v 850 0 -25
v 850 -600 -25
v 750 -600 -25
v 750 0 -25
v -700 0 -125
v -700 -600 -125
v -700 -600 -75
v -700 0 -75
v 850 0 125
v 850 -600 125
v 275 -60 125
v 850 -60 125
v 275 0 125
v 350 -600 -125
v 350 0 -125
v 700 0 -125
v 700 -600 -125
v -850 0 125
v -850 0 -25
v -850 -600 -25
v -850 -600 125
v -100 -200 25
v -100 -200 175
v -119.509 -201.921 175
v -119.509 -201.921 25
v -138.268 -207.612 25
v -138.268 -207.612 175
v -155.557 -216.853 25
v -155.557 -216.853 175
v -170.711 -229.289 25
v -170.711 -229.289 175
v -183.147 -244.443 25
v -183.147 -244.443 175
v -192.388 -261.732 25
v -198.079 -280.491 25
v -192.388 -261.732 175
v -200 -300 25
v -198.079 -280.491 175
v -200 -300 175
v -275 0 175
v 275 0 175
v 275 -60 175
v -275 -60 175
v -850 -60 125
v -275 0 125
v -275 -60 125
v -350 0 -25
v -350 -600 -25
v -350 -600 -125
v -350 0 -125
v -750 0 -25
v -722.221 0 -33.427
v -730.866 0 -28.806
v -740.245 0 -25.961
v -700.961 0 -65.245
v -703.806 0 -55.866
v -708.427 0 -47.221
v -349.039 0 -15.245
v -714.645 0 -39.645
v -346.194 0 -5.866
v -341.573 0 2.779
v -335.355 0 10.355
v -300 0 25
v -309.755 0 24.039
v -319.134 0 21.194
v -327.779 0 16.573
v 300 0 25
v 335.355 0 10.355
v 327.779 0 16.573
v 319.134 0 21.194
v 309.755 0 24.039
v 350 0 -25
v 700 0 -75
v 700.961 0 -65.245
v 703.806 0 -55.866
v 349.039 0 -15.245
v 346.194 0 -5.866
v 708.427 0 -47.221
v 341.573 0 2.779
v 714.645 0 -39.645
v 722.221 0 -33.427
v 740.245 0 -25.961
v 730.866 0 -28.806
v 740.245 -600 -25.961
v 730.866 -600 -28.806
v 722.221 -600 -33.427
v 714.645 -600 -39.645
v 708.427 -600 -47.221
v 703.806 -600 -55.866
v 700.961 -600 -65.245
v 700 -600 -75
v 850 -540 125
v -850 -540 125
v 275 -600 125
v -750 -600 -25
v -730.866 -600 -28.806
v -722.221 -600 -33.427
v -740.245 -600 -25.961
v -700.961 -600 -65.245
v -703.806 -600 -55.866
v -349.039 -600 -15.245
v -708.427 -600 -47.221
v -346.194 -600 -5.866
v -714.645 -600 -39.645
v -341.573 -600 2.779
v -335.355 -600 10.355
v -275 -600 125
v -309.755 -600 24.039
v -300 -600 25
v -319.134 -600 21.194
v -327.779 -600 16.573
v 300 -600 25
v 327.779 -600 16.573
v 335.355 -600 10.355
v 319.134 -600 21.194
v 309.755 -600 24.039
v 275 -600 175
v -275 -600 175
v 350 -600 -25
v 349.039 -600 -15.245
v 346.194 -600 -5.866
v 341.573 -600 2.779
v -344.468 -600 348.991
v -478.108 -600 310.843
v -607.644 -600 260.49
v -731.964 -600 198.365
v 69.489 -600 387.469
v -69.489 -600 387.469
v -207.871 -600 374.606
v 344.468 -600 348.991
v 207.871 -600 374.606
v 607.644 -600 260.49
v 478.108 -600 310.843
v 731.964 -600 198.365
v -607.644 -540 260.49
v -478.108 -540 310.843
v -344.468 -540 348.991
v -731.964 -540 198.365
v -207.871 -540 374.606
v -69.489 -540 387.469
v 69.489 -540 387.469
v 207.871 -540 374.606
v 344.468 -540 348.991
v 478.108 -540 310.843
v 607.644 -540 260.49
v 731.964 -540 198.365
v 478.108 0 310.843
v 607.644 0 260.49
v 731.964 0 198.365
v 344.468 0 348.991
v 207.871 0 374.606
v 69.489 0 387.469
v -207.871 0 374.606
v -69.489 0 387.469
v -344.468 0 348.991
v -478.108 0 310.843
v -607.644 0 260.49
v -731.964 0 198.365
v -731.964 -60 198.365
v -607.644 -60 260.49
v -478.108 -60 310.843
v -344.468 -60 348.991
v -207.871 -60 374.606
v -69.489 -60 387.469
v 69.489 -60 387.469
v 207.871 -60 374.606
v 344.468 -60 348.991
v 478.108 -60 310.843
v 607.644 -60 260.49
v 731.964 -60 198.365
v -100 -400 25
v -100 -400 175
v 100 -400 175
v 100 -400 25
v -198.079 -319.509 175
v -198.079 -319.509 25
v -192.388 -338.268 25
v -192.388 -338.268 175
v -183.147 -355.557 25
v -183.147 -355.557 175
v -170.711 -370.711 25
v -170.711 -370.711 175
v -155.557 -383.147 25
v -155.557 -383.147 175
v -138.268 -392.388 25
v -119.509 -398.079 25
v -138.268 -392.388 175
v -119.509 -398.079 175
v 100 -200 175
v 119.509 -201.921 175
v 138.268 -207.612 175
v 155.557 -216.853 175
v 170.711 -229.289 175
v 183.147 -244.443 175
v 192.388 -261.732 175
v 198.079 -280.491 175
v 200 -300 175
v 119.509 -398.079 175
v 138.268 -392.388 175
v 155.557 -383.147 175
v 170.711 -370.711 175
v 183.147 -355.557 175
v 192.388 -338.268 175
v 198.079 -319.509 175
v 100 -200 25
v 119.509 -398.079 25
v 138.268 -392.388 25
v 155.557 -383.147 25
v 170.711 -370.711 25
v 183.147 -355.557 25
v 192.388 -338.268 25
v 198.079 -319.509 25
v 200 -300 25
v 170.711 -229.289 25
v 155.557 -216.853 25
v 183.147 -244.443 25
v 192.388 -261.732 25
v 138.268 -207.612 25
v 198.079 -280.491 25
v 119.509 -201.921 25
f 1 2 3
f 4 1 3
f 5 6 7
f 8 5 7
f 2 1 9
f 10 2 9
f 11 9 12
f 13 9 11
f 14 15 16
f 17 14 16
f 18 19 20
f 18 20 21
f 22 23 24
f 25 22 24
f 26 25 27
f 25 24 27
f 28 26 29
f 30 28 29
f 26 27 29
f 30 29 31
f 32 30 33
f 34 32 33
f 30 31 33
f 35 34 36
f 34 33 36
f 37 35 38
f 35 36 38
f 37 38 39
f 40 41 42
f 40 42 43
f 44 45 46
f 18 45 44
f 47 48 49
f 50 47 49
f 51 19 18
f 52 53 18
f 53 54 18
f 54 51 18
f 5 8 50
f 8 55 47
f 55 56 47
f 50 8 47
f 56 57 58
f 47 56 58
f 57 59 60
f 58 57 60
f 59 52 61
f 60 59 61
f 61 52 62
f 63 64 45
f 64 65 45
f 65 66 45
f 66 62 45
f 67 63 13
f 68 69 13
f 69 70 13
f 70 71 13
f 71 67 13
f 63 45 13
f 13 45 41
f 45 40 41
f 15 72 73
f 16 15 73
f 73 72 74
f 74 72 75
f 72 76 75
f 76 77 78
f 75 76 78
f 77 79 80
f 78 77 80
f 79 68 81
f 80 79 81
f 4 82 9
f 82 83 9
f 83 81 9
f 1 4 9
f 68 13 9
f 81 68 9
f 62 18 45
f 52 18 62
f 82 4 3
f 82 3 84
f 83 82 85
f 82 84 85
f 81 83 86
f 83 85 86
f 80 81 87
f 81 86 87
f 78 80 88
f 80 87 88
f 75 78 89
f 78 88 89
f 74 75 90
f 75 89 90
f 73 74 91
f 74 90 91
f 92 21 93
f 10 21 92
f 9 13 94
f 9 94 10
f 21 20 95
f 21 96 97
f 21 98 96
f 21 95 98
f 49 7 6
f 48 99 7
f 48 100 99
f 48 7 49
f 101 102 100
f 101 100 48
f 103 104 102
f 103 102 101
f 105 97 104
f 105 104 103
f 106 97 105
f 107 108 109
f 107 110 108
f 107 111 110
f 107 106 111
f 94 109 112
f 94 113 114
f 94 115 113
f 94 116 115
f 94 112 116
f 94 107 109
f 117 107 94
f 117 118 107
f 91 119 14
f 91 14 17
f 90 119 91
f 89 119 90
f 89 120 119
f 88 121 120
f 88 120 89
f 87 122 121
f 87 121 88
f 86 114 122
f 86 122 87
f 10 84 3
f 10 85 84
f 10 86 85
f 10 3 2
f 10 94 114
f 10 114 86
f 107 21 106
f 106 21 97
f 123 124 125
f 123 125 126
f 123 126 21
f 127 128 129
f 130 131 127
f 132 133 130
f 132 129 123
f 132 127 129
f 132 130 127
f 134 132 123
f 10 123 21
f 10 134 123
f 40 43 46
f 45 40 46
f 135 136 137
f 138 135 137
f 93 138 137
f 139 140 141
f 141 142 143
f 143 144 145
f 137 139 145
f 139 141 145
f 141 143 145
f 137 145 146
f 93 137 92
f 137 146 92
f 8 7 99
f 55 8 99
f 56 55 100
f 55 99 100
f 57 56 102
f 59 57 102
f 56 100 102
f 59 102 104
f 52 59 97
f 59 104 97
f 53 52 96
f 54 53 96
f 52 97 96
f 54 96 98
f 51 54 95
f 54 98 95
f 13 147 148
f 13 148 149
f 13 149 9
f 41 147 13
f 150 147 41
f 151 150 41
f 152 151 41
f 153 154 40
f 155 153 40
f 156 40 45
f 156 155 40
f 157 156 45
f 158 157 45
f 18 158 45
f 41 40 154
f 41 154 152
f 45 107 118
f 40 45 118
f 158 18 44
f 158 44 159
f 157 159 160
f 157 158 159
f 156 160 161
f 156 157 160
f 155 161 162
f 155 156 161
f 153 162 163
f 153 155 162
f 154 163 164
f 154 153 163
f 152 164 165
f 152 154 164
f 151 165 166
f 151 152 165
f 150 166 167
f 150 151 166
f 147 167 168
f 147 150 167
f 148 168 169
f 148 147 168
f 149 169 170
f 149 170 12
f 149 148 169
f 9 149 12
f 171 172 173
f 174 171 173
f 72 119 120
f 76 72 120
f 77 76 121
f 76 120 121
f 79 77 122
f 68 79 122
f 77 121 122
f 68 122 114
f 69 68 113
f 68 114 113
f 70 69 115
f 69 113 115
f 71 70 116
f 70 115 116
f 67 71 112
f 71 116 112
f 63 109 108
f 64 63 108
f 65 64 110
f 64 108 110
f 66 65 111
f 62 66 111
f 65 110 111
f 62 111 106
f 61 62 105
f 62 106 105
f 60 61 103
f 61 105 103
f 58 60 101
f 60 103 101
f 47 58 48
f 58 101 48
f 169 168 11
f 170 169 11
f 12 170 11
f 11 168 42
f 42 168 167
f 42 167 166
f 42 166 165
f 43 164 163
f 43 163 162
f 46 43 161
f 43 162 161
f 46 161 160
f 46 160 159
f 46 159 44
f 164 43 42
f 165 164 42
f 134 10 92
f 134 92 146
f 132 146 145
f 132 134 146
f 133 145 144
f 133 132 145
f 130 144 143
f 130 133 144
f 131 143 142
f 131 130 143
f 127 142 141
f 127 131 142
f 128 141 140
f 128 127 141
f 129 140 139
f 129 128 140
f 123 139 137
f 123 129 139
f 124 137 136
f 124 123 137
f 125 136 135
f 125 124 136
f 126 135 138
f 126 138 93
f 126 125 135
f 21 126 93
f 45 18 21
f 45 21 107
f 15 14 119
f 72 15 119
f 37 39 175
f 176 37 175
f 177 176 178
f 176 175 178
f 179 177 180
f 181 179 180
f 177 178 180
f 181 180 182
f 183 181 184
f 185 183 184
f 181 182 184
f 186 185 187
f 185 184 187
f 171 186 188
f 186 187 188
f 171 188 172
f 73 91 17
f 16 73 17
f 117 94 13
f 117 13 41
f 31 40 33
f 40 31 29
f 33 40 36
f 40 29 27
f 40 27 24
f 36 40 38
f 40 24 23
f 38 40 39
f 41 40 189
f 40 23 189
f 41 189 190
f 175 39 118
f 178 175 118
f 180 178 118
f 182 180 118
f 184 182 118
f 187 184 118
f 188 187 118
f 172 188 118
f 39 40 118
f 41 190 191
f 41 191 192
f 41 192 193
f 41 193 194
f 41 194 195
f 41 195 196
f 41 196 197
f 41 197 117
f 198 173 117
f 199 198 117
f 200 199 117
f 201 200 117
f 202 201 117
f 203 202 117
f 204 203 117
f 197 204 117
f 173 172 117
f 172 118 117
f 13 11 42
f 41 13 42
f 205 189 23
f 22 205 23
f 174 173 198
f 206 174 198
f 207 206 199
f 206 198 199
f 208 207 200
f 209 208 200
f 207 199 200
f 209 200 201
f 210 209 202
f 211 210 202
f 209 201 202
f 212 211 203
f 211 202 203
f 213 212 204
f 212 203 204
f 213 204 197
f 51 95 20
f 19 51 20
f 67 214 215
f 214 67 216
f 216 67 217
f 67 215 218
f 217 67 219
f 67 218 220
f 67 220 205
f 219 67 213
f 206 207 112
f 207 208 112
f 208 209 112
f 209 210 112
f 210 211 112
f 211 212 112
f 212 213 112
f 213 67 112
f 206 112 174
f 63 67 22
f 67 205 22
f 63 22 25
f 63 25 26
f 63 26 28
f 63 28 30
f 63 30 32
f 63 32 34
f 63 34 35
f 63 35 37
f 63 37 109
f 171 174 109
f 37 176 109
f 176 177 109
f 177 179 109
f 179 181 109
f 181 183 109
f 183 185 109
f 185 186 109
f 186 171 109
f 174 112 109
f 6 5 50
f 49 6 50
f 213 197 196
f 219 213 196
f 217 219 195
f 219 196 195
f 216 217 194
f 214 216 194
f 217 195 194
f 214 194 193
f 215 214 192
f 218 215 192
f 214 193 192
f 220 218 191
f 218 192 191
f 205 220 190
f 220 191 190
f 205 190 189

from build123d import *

# Parameters (mm, degrees)
F0_W      = 1700
F0_H      = 250
F1_DEPTH  = 600
F3_DEPTH  = 600.001
F4_W      = 550
F4_H      = 50
F5_DEPTH  = 600
F7_DEPTH  = 300.001
F8_W      = 550
F8_H      = 50
F9_DEPTH  = 60
F11_DEPTH = 60


with BuildPart() as f1:
    # F0 (on Front) → F1 (new body)
    with BuildSketch(Plane.XZ):
        Rectangle(F0_W, F0_H)
    extrude(amount=F1_DEPTH)

    # F2 (on face) → F3 (cut, through all)
    with BuildSketch(Plane.XZ.offset(600)):
        with BuildLine():
            ThreePointArc((350, -25), (335.3553390593, 10.3553390593), (300, 25))
            Line((300, 25), (-300, 25))
            ThreePointArc((-300, 25), (-335.3553390593, 10.3553390593), (-350, -25))
            Line((-350, -25), (-350, -125))
            Line((-350, -125), (350, -125))
            Line((350, -125), (350, -25))
        make_face()
        with BuildLine():
            Line((-700, -125), (-700, -75))
            ThreePointArc((-700, -75), (-714.6446609407, -39.6446609407), (-750, -25))
            Line((-750, -25), (-850, -25))
            Line((-850, -25), (-850, -125))
            Line((-850, -125), (-700, -125))
        make_face()
        with BuildLine():
            Line((700, -75), (700, -125))
            Line((700, -125), (850, -125))
            Line((850, -125), (850, -25))
            Line((850, -25), (750, -25))
            ThreePointArc((750, -25), (714.6446609407, -39.6446609407), (700, -75))
        make_face()
    extrude(amount=-F3_DEPTH, mode=Mode.SUBTRACT)

    # F4 (on face) → F5 (join)
    with BuildSketch(Plane.XZ.offset(600)):
        with Locations((0, 150)):
            Rectangle(F4_W, F4_H)
    extrude(amount=-F5_DEPTH)

    # F6 (on face) → F7 (cut, through all)
    with BuildSketch(Plane.XY.offset(175)):
        with BuildLine():
            ThreePointArc((200, -300), (170.7106781187, -229.2893218813), (100, -200))
            Line((100, -200), (-100, -200))
            ThreePointArc((-100, -200), (-170.7106781187, -229.2893218813), (-200, -300))
            ThreePointArc((-200, -300), (-170.7106781187, -370.7106781187), (-100, -400))
            Line((-100, -400), (100, -400))
            ThreePointArc((100, -400), (170.7106781187, -370.7106781187), (200, -300))
        make_face()
    extrude(amount=-F7_DEPTH, mode=Mode.SUBTRACT)


with BuildPart() as f9:
    # F8 (on face) → F9 (new body)
    with BuildSketch(Plane.XZ.offset(600)):
        with Locations((0, 150)):
            Rectangle(F8_W, F8_H)
        with BuildLine():
            Line((275, 125), (850, 125))
            ThreePointArc((850, 125), (0, 389.0792905692), (-850, 125))
            Line((-850, 125), (-275, 125))
            Line((-275, 125), (-275, 175))
            Line((-275, 175), (275, 175))
            Line((275, 175), (275, 125))
        make_face()
    extrude(amount=-F9_DEPTH)


with BuildPart() as f11:
    # F10 (on face) → F11 (new body)
    with BuildSketch(Plane(origin=(0, 0, 0), x_dir=(-1, 0, 0), z_dir=(0, 1, 0))):
        with BuildLine():
            Line((275, 125), (850, 125))
            ThreePointArc((850, 125), (0, 389.0792905692), (-850, 125))
            Line((-850, 125), (-275, 125))
            Line((-275, 125), (-275, 175))
            Line((-275, 175), (275, 175))
            Line((275, 175), (275, 125))
        make_face()
    extrude(amount=-F11_DEPTH)


solid = Compound([f1.part, f9.part, f11.part])
